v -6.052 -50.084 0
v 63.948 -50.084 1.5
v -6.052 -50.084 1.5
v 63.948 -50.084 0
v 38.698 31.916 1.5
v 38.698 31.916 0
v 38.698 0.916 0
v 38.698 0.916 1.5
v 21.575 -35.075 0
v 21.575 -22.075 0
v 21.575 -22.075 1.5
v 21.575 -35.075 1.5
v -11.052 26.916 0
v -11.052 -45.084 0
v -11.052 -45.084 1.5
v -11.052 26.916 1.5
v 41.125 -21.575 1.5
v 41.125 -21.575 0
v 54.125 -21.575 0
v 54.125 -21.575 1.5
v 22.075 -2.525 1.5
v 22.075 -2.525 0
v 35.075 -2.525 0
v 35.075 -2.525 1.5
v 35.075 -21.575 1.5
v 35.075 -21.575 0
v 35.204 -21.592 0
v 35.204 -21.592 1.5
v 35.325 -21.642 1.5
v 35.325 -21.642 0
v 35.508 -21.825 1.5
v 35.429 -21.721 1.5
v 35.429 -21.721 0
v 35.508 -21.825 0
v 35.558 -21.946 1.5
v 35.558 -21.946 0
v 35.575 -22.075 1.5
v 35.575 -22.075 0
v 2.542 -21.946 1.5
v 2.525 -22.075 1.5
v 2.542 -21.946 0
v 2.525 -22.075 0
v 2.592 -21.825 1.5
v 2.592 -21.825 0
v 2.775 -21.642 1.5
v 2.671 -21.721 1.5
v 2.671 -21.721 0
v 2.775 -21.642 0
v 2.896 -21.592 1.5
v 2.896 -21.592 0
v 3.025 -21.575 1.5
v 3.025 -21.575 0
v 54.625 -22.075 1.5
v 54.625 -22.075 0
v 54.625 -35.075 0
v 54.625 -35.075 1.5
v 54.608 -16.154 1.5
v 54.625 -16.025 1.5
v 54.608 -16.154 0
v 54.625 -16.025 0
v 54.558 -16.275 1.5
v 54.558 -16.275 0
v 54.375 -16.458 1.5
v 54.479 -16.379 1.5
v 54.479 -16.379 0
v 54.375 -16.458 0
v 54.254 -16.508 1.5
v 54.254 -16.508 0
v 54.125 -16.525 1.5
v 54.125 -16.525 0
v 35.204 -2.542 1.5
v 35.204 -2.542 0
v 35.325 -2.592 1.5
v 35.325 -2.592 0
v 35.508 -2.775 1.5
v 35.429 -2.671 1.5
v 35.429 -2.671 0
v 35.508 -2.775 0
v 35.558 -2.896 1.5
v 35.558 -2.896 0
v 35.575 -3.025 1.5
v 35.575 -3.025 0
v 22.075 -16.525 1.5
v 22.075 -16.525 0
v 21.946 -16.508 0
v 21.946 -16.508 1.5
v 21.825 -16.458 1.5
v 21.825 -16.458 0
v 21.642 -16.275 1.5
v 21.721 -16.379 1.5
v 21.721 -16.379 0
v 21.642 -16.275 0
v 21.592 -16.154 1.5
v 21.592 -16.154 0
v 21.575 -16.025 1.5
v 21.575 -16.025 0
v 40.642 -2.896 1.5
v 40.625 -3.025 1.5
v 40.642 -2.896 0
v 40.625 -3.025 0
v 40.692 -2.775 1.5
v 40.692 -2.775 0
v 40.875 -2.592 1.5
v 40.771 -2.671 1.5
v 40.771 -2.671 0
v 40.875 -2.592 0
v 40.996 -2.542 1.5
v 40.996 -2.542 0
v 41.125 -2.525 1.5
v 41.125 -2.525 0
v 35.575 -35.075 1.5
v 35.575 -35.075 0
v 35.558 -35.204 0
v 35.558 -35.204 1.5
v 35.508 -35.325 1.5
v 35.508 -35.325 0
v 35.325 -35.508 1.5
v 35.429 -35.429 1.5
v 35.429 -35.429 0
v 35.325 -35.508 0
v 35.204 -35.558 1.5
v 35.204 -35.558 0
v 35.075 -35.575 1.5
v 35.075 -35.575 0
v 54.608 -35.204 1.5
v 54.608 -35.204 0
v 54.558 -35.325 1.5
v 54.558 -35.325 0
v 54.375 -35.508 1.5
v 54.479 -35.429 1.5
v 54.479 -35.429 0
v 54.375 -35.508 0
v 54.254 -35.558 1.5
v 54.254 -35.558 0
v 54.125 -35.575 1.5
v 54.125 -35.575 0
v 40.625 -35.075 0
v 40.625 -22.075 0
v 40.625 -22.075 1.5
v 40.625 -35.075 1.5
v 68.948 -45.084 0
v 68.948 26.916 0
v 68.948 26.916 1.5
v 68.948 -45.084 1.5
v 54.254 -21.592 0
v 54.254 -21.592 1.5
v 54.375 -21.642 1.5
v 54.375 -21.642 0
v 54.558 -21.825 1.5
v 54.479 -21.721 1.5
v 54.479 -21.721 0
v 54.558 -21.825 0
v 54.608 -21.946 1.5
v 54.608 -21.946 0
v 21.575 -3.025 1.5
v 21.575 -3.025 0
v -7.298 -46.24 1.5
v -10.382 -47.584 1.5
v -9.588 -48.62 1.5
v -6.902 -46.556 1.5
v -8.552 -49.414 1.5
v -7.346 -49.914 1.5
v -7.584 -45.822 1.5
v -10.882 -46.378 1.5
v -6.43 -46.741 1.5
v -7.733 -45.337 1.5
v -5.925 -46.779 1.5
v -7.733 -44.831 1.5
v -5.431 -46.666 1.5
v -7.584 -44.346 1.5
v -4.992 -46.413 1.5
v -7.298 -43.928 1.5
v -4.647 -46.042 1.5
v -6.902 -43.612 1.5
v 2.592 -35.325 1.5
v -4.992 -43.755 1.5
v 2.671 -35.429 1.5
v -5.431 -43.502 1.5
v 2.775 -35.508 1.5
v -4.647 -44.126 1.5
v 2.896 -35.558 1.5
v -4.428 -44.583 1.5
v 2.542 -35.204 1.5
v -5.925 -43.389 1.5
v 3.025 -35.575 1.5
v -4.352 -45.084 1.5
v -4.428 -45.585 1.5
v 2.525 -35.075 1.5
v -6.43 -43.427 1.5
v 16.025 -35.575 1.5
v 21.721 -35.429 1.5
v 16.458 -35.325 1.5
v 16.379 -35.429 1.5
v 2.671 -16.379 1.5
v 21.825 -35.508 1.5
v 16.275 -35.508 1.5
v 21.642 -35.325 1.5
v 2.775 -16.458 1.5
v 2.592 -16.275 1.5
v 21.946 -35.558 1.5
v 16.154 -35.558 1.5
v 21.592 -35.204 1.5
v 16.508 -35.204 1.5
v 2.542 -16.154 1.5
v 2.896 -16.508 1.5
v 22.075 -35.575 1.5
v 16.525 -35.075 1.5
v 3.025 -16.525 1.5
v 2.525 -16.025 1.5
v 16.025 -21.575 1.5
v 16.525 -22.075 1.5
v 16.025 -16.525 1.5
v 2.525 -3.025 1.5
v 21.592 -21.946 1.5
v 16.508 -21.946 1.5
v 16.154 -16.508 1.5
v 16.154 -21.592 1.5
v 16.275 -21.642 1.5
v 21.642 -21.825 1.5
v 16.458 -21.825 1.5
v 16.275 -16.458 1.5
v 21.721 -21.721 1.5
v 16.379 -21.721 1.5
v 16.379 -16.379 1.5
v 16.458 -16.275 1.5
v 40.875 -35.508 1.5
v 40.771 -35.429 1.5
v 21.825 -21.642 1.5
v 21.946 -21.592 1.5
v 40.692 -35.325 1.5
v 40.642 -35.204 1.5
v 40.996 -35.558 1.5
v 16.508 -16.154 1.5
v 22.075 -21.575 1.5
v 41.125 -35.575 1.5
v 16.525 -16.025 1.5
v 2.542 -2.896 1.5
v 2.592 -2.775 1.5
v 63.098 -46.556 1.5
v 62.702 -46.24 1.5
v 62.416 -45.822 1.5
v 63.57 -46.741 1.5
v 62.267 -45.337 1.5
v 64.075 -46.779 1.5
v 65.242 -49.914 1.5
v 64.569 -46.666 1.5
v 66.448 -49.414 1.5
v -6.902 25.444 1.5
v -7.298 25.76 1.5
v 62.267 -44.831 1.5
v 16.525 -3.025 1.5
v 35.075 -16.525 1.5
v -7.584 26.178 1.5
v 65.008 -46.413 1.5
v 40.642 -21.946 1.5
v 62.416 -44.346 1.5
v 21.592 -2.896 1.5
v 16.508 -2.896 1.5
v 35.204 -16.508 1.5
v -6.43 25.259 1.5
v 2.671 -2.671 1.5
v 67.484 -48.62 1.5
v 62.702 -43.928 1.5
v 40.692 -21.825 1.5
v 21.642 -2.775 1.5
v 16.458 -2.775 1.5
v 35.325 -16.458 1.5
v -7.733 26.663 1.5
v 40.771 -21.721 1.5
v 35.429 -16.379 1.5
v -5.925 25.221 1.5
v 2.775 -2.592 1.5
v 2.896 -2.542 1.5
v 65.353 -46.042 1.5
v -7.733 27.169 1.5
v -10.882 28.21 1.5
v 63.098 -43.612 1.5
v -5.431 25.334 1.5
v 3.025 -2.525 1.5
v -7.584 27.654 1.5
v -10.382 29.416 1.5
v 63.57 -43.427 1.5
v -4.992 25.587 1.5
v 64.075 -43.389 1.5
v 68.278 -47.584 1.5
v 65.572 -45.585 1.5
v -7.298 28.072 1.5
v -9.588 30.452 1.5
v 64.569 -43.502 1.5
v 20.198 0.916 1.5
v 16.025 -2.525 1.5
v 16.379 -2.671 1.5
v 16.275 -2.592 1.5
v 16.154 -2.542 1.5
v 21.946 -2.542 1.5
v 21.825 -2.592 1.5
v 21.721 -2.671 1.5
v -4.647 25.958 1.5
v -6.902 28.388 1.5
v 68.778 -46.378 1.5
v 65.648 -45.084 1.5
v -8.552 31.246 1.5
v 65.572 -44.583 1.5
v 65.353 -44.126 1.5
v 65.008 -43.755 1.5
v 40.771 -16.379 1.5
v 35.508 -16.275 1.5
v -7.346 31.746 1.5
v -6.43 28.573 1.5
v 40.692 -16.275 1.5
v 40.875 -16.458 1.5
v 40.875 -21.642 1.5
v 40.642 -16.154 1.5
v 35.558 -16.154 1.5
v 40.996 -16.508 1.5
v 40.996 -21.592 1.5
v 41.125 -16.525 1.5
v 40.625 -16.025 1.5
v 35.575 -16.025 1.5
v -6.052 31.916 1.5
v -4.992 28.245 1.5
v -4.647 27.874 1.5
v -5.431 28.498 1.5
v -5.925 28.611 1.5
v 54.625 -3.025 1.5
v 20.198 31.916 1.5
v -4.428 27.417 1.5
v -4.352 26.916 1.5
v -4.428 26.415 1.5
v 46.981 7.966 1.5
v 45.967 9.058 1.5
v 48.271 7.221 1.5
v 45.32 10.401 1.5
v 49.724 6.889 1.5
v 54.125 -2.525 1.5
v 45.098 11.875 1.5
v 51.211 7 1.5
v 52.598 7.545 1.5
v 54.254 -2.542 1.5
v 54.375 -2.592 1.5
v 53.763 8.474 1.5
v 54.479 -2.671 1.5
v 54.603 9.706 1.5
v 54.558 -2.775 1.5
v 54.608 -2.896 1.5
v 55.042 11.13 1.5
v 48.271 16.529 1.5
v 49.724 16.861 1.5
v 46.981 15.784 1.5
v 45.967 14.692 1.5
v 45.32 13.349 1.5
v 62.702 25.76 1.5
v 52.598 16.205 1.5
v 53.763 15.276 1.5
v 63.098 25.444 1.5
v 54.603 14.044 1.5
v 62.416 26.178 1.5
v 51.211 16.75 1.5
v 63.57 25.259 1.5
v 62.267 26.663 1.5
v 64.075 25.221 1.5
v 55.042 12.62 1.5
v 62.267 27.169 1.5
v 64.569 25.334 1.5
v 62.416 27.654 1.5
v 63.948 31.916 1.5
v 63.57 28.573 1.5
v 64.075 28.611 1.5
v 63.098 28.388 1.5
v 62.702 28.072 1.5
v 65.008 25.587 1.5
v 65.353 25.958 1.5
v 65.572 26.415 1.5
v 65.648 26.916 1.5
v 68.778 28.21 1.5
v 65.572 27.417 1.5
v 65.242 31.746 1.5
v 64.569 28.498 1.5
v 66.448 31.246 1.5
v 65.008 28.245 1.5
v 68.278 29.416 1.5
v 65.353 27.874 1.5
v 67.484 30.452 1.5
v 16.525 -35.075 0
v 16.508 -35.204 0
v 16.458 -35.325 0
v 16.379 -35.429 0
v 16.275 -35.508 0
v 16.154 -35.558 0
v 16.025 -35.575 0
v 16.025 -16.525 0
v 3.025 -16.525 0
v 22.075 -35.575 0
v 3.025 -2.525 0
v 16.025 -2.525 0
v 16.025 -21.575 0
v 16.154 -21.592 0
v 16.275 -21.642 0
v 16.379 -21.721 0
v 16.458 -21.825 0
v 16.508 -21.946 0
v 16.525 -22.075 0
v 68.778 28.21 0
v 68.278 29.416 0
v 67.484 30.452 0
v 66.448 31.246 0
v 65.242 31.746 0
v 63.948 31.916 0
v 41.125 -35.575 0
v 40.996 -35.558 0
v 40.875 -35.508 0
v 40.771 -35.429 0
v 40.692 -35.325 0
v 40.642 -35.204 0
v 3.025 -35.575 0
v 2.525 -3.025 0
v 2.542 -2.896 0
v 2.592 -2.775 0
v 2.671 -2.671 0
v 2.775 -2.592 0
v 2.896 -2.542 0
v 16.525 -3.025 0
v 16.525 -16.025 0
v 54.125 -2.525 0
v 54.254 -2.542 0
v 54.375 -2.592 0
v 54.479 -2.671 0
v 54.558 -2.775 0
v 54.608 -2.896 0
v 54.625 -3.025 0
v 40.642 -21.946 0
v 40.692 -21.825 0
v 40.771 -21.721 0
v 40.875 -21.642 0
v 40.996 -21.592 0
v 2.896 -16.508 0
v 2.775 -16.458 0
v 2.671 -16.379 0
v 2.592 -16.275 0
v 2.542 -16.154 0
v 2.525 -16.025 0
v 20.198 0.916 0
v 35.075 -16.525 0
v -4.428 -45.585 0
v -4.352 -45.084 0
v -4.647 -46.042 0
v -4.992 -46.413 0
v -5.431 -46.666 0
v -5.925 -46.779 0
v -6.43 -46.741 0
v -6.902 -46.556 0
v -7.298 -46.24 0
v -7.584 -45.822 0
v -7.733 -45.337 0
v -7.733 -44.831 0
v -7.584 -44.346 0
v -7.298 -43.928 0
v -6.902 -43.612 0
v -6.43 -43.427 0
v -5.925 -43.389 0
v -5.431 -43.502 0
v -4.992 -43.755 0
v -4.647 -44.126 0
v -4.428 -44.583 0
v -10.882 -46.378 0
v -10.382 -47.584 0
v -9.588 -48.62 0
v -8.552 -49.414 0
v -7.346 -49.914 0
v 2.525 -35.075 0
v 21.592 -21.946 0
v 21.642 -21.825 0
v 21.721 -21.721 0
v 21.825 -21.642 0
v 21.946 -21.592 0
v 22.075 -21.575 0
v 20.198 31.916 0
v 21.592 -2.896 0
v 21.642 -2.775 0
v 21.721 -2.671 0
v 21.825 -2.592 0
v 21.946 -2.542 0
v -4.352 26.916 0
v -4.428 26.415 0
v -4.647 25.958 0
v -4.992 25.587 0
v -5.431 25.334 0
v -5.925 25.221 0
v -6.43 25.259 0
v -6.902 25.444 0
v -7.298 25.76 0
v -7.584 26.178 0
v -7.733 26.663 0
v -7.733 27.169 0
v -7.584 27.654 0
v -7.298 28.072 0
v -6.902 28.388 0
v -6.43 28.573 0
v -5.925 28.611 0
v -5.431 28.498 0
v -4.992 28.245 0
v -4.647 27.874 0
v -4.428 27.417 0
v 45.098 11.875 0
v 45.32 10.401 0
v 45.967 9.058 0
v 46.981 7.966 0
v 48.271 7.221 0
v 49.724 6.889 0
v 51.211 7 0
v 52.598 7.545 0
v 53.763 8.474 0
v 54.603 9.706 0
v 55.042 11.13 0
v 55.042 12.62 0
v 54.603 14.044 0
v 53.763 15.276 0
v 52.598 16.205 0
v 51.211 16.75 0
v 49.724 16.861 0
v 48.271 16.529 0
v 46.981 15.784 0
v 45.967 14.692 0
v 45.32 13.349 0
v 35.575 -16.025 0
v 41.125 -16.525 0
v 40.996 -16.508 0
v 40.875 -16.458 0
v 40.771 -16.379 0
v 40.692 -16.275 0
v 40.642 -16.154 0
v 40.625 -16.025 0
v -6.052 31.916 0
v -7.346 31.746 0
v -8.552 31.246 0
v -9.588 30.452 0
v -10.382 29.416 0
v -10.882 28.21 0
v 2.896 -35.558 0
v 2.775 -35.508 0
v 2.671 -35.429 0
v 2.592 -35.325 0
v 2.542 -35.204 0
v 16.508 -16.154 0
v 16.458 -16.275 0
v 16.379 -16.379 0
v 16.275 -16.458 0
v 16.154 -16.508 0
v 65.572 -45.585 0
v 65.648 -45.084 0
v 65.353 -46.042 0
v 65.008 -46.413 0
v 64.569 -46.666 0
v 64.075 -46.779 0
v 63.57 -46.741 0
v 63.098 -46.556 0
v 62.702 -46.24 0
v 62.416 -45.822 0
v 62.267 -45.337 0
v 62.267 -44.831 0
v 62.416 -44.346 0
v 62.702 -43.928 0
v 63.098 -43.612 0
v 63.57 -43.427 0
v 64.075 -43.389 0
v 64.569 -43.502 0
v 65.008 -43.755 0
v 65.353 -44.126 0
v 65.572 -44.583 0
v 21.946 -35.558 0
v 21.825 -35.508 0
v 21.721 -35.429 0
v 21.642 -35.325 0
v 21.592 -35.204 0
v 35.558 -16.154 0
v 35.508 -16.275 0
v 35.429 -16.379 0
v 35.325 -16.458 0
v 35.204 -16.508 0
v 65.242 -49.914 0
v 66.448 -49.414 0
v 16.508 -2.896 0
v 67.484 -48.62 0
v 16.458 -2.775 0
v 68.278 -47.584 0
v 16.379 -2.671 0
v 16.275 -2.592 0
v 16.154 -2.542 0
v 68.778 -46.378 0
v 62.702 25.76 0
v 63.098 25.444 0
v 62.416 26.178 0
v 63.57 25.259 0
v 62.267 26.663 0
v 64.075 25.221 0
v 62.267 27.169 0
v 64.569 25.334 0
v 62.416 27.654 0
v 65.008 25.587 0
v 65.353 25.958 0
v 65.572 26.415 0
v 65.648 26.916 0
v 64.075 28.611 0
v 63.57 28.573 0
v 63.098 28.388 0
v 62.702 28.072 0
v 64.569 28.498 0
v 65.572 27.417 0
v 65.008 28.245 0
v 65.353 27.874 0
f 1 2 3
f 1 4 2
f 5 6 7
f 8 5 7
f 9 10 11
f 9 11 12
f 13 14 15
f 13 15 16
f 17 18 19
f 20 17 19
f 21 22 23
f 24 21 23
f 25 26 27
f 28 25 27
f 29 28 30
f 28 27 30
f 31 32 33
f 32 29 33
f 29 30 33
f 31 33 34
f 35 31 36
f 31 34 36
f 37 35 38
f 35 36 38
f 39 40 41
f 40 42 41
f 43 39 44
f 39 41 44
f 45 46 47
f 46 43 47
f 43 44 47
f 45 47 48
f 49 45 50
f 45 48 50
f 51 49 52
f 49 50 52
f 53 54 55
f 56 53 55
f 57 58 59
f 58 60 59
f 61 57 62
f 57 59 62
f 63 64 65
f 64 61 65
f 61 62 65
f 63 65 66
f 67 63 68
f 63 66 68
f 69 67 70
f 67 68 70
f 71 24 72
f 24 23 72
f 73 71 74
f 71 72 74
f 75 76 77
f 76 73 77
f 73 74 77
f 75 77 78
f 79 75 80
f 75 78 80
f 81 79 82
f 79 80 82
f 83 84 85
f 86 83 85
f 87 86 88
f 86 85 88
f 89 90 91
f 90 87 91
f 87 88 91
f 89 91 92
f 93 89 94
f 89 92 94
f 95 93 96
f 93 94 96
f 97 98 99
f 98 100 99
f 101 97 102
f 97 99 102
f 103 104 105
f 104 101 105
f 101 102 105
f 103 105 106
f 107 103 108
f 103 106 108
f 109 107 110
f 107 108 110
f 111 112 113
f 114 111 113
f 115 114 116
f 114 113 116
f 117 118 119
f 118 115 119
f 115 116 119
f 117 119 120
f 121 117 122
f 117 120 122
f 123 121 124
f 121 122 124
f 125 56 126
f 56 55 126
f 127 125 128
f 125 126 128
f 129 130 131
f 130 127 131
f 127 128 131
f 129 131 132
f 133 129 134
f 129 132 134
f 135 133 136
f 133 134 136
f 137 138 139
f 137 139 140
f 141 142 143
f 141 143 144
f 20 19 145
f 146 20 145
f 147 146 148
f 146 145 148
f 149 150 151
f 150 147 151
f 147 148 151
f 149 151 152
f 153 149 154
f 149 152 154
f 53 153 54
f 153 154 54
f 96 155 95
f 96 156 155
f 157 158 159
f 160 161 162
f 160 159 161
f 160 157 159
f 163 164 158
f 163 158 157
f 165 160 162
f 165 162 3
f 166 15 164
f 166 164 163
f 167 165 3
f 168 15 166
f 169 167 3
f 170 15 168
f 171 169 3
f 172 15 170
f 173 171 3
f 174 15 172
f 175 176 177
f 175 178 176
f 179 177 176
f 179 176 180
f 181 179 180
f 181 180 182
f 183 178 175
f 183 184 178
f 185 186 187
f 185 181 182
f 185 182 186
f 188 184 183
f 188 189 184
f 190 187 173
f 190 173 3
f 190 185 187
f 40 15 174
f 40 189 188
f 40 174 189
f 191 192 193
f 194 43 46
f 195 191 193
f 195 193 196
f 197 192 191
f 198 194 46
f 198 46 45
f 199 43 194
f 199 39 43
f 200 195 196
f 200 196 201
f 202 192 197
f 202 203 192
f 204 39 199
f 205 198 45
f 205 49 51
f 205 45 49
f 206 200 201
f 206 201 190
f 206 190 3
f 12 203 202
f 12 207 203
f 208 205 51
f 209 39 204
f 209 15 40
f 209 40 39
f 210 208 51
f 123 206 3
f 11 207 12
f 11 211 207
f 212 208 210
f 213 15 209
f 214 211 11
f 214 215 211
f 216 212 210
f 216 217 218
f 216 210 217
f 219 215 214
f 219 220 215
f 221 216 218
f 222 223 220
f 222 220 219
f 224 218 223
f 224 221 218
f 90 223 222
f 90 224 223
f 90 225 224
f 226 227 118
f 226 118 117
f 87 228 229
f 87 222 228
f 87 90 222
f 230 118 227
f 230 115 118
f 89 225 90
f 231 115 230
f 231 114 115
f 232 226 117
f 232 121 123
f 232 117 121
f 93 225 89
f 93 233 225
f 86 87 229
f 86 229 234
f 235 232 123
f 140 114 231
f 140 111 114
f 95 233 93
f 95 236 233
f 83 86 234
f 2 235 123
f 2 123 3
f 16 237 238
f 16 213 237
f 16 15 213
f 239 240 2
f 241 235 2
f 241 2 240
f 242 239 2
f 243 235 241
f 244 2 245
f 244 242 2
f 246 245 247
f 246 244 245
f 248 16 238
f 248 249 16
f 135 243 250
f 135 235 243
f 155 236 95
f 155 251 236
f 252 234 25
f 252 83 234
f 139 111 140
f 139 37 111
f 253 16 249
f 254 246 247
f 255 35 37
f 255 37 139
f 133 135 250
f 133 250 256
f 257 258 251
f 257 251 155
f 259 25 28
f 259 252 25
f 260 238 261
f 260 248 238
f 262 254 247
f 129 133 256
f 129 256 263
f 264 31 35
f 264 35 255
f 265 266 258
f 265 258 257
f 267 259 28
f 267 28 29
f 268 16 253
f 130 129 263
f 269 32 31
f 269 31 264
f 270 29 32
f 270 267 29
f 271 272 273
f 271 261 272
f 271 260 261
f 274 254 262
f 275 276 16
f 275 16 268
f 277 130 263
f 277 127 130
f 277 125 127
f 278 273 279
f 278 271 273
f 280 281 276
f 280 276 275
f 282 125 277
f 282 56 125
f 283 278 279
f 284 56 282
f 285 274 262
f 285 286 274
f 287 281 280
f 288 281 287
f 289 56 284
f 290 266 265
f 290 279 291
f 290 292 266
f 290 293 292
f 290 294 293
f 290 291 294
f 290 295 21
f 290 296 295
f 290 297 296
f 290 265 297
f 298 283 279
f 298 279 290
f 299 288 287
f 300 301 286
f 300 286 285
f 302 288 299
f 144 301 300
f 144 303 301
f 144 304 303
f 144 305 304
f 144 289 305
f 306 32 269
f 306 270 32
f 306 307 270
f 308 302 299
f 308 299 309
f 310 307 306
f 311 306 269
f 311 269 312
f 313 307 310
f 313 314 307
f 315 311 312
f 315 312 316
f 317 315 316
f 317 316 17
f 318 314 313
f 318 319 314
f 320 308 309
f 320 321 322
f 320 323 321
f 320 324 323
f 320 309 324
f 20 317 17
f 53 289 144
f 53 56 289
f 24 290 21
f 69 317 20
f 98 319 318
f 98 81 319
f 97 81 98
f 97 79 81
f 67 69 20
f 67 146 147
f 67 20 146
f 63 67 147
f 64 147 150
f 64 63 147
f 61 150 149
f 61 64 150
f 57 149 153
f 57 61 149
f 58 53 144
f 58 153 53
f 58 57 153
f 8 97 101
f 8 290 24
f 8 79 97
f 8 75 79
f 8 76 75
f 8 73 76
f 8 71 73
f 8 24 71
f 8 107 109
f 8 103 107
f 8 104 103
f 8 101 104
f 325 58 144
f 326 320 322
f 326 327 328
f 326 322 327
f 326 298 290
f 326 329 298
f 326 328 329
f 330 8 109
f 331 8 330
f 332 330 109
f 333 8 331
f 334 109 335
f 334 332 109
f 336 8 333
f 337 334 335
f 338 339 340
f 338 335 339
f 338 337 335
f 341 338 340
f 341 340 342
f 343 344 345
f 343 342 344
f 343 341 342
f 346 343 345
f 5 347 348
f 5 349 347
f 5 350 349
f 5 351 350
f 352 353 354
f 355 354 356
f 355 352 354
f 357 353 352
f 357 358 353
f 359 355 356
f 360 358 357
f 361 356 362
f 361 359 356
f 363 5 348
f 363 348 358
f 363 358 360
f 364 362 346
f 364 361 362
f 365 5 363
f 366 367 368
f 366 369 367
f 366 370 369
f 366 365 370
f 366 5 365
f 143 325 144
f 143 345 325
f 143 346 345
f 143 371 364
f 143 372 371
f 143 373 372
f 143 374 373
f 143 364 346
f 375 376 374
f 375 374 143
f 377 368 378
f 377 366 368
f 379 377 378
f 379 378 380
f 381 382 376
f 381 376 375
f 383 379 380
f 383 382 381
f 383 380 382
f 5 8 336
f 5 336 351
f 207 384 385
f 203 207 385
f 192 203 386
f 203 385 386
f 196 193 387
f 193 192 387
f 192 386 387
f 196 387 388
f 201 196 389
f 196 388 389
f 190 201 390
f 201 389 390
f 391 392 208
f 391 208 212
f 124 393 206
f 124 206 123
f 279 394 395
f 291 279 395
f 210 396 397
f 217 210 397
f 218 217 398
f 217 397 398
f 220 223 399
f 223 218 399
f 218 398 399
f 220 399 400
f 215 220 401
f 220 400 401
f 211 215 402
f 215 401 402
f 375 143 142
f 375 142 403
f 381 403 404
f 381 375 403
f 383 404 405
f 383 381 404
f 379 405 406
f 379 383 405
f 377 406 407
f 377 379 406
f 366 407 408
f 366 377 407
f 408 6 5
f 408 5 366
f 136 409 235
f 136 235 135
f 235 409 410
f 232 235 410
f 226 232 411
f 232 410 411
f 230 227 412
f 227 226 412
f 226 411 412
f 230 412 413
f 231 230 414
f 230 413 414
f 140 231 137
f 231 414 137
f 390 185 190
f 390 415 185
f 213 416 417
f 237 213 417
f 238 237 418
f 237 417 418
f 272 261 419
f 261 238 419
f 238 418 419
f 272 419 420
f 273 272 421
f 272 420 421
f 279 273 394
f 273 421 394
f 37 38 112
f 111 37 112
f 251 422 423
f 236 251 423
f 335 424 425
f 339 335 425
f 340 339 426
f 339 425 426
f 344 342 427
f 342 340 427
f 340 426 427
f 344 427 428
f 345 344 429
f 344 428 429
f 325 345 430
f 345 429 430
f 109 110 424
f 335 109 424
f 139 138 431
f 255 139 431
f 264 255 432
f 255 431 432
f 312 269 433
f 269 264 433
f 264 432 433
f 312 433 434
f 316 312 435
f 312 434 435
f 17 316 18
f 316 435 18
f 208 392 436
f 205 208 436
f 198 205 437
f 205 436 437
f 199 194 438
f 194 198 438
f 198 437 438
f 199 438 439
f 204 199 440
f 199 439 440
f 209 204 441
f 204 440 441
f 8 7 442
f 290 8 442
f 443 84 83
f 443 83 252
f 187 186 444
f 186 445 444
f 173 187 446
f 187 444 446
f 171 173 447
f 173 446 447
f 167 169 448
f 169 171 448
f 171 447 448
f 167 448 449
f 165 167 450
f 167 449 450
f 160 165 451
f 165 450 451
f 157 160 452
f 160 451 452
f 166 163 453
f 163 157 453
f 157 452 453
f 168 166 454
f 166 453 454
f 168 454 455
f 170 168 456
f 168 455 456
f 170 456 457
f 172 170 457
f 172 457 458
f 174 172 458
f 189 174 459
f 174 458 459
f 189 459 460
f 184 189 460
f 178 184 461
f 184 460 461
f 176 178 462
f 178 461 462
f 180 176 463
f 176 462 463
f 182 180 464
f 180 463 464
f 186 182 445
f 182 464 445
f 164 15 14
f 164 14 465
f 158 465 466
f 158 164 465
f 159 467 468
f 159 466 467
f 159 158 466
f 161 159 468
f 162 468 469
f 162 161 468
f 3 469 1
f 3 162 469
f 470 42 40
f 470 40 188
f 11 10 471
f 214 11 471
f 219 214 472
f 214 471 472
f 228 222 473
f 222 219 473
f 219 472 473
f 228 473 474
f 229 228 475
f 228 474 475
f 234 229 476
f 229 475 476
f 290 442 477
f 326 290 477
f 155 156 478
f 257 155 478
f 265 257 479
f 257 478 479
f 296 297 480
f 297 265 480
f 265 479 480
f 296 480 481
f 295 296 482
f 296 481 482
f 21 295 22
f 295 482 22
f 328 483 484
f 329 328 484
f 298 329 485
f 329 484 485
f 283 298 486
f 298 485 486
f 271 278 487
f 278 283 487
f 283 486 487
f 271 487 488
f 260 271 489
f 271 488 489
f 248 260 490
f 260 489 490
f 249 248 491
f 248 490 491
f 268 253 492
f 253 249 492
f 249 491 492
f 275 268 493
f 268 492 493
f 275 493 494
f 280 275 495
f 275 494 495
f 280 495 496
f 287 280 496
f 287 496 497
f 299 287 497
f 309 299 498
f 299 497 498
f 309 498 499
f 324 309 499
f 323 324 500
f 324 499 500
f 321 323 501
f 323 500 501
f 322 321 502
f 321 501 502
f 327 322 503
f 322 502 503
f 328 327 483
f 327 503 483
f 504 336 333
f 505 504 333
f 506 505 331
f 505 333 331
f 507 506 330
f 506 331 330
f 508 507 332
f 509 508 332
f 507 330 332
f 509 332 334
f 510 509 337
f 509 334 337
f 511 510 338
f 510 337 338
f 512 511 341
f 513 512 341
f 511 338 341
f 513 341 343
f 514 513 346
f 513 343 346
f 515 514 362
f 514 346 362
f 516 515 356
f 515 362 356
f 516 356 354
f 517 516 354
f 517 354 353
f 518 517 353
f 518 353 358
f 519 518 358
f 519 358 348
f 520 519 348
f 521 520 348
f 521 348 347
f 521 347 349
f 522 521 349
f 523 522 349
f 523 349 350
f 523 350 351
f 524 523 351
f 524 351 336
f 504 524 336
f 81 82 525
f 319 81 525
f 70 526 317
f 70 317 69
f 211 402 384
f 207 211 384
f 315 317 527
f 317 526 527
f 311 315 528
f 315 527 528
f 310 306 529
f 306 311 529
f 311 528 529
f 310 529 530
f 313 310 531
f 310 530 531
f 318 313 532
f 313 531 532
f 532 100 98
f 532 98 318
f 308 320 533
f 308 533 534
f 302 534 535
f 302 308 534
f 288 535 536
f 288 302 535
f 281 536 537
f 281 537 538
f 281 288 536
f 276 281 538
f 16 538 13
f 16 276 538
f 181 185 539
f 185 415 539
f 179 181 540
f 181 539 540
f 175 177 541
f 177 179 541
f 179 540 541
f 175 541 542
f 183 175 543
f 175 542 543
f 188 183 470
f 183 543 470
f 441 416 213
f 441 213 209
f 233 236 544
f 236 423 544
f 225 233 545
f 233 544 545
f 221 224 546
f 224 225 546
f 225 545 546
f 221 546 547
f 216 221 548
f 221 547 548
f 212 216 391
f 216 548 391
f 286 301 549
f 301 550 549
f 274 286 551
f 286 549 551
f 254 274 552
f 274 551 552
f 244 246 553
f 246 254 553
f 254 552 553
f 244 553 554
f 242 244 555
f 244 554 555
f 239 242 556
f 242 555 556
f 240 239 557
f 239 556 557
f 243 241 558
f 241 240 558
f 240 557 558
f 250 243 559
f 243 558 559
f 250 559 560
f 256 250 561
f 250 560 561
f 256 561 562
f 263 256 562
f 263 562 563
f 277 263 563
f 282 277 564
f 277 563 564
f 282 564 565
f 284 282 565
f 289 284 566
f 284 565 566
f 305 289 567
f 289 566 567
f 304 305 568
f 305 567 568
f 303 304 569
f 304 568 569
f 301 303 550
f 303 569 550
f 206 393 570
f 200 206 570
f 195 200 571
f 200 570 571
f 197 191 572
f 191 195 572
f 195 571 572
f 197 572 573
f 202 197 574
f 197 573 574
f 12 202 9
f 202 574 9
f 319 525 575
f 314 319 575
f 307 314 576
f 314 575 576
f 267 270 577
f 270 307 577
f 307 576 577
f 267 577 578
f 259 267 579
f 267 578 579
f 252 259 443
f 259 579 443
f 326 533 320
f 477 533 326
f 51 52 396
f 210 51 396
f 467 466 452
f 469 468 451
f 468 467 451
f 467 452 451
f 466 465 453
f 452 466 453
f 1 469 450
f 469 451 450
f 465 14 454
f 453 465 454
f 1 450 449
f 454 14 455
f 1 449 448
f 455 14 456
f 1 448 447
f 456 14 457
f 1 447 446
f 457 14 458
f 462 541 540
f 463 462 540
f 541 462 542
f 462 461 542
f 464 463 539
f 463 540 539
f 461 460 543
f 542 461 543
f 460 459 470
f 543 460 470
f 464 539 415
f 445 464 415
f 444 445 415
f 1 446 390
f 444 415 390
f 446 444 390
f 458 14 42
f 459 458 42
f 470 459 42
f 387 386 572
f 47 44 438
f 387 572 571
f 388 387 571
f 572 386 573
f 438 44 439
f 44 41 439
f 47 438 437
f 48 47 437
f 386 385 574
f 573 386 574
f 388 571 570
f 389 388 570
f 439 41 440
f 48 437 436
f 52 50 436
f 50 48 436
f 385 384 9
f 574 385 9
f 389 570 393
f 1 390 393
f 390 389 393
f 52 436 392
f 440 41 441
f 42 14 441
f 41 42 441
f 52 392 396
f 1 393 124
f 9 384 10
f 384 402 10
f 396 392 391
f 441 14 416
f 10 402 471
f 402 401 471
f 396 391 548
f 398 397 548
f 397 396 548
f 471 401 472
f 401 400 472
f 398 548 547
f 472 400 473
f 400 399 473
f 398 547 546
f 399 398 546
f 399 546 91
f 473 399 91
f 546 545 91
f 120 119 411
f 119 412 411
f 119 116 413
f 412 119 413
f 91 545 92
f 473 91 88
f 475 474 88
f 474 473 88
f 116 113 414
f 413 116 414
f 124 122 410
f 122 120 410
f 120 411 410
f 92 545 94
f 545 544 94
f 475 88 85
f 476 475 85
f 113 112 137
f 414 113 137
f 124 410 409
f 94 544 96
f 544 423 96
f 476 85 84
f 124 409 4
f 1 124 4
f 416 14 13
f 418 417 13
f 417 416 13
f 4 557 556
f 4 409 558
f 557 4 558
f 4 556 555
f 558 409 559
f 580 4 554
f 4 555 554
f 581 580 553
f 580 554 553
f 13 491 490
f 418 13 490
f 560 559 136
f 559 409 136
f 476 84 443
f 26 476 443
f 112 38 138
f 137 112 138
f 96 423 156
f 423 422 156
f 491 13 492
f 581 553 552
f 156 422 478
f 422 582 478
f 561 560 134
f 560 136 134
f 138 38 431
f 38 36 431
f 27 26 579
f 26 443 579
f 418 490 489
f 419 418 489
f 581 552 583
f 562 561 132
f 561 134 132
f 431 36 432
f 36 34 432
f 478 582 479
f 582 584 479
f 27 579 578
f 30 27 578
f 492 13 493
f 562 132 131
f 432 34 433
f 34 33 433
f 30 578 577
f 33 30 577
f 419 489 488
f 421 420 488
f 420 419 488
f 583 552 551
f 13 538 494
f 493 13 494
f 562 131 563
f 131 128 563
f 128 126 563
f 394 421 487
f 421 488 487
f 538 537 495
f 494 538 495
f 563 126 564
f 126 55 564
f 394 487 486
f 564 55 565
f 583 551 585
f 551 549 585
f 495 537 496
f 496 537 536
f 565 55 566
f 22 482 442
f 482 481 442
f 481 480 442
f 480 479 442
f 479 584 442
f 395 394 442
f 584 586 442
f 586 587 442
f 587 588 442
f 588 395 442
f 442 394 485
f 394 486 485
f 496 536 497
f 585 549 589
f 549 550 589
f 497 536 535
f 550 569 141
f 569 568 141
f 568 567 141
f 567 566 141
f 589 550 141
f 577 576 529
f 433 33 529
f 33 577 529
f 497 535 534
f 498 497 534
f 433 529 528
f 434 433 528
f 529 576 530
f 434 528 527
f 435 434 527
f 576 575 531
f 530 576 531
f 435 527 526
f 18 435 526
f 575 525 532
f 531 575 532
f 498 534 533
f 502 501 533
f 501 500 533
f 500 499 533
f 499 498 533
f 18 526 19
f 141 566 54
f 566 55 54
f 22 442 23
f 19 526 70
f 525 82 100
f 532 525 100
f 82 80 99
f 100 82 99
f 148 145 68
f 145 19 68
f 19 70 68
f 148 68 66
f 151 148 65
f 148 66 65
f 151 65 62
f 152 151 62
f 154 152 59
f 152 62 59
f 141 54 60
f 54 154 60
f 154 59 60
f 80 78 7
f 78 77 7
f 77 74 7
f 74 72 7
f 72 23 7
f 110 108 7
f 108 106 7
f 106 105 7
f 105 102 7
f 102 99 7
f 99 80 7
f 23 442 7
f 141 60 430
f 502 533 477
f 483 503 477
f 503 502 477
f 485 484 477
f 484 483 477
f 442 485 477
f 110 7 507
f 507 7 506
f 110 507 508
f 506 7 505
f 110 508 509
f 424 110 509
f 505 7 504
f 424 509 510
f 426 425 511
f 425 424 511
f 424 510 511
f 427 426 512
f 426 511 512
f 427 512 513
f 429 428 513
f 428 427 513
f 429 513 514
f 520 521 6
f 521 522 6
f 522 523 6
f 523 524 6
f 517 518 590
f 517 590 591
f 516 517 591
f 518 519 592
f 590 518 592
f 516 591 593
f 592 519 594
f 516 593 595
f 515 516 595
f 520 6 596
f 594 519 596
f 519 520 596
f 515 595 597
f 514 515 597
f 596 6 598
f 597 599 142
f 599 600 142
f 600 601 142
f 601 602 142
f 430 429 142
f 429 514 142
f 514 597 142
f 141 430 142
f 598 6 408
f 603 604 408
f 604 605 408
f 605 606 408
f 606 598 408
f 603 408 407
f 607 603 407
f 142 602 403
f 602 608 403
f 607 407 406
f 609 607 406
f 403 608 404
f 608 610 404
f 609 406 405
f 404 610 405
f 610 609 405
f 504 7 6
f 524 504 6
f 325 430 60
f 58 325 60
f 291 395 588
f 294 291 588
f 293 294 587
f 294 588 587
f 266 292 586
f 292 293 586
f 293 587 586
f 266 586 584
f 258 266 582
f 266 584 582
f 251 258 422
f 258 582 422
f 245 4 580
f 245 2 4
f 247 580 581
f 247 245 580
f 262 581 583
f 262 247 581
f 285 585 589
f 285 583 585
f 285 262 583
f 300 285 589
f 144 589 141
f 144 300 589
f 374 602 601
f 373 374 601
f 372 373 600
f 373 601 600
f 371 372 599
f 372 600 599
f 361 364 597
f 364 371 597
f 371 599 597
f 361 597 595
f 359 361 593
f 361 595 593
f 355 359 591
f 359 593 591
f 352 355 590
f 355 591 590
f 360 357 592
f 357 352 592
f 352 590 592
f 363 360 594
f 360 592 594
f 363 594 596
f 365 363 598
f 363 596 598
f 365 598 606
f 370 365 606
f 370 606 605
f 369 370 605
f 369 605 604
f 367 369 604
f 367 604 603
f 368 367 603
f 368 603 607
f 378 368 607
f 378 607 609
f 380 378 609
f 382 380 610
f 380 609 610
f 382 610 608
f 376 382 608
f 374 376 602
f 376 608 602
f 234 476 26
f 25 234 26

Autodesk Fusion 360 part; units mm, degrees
sketch "Sketch1" plane through (0, 0, 0) normal (0, 0, 1) x (1, 0, 0)
  line L0 (3.025, -2.525) -> (16.025, -2.525)
  line L1 (3.025, -16.525) -> (16.025, -16.525)
  line L2 (2.525, -3.025) -> (2.525, -16.025)
  line L3 (16.525, -3.025) -> (16.525, -16.025)
  arc A0 (3.025, -2.525) -> (2.525, -3.025) centre (3.025, -3.025) ccw
  arc A1 (16.525, -3.025) -> (16.025, -2.525) centre (16.025, -3.025) ccw
  arc A2 (2.525, -16.025) -> (3.025, -16.525) centre (3.025, -16.025) ccw
  arc A3 (16.025, -16.525) -> (16.525, -16.025) centre (16.025, -16.025) ccw
  line L4 (22.075, -2.525) -> (35.075, -2.525)
  line L5 (22.075, -16.525) -> (35.075, -16.525)
  line L6 (21.575, -3.025) -> (21.575, -16.025)
  line L7 (35.575, -3.025) -> (35.575, -16.025)
  arc A4 (22.075, -2.525) -> (21.575, -3.025) centre (22.075, -3.025) ccw
  arc A5 (35.575, -3.025) -> (35.075, -2.525) centre (35.075, -3.025) ccw
  arc A6 (21.575, -16.025) -> (22.075, -16.525) centre (22.075, -16.025) ccw
  arc A7 (35.075, -16.525) -> (35.575, -16.025) centre (35.075, -16.025) ccw
  line L8 (41.125, -2.525) -> (54.125, -2.525)
  line L9 (41.125, -16.525) -> (54.125, -16.525)
  line L10 (40.625, -3.025) -> (40.625, -16.025)
  line L11 (54.625, -3.025) -> (54.625, -16.025)
  arc A8 (41.125, -2.525) -> (40.625, -3.025) centre (41.125, -3.025) ccw
  arc A9 (54.625, -3.025) -> (54.125, -2.525) centre (54.125, -3.025) ccw
  arc A10 (40.625, -16.025) -> (41.125, -16.525) centre (41.125, -16.025) ccw
  arc A11 (54.125, -16.525) -> (54.625, -16.025) centre (54.125, -16.025) ccw
  line L12 (3.025, -21.575) -> (16.025, -21.575)
  line L13 (3.025, -35.575) -> (16.025, -35.575)
  line L14 (2.525, -22.075) -> (2.525, -35.075)
  line L15 (16.525, -22.075) -> (16.525, -35.075)
  arc A12 (3.025, -21.575) -> (2.525, -22.075) centre (3.025, -22.075) ccw
  arc A13 (16.525, -22.075) -> (16.025, -21.575) centre (16.025, -22.075) ccw
  arc A14 (2.525, -35.075) -> (3.025, -35.575) centre (3.025, -35.075) ccw
  arc A15 (16.025, -35.575) -> (16.525, -35.075) centre (16.025, -35.075) ccw
  line L16 (22.075, -21.575) -> (35.075, -21.575)
  line L17 (22.075, -35.575) -> (35.075, -35.575)
  line L18 (21.575, -22.075) -> (21.575, -35.075)
  line L19 (35.575, -22.075) -> (35.575, -35.075)
  arc A16 (22.075, -21.575) -> (21.575, -22.075) centre (22.075, -22.075) ccw
  arc A17 (35.575, -22.075) -> (35.075, -21.575) centre (35.075, -22.075) ccw
  arc A18 (21.575, -35.075) -> (22.075, -35.575) centre (22.075, -35.075) ccw
  arc A19 (35.075, -35.575) -> (35.575, -35.075) centre (35.075, -35.075) ccw
  line L20 (41.125, -21.575) -> (54.125, -21.575)
  line L21 (41.125, -35.575) -> (54.125, -35.575)
  line L22 (40.625, -22.075) -> (40.625, -35.075)
  line L23 (54.625, -22.075) -> (54.625, -35.075)
  arc A20 (41.125, -21.575) -> (40.625, -22.075) centre (41.125, -22.075) ccw
  arc A21 (54.625, -22.075) -> (54.125, -21.575) centre (54.125, -22.075) ccw
  arc A22 (40.625, -35.075) -> (41.125, -35.575) centre (41.125, -35.075) ccw
  arc A23 (54.125, -35.575) -> (54.625, -35.075) centre (54.125, -35.075) ccw
  line L24 (-11.052, 31.916) -> (68.948, 31.916)
  line L25 (68.948, 31.916) -> (68.948, -50.084)
  line L26 (68.948, -50.084) -> (-11.052, -50.084)
  line L27 (-11.052, -50.084) -> (-11.052, 31.916)
  line L28 (20.198, 31.916) -> (38.698, 31.916)
  line L29 (38.698, 31.916) -> (38.698, 0.916)
  line L30 (38.698, 0.916) -> (20.198, 0.916)
  line L31 (20.198, 0.916) -> (20.198, 31.916)
  circle A24 centre (-6.052, 26.916) radius 1.7
  circle A25 centre (-6.052, -45.084) radius 1.7
  circle A26 centre (63.948, -45.084) radius 1.7
  circle A27 centre (63.948, 26.916) radius 1.7
  dimension "d1" = 80
  dimension "d2" = 82
  dimension "d4" = 13.577
  dimension "d5" = 14.509
  dimension "d6" = 18.5
  dimension "d7" = 31
  dimension "d8" = 31.25
  dimension "d9" = 3.4
  dimension "d10" = 5
  dimension "d11" = 5
  dimension "d12" = 3.4
  dimension "d13" = 5
  dimension "d14" = 5
  dimension "d15" = 3.4
  dimension "d16" = 5
  dimension "d17" = 5
  dimension "d18" = 3.4
  dimension "d19" = 5
  dimension "d20" = 5
extrude "Extrude1" add sketch "Sketch1" along normal blind 1.5 contours L24 L25 L26 L27 L29 L30 L31
fillet "Fillet1" radius 5 4 edges at (-11.052, -50.084, 0.75) (-11.052, 31.916, 0.75) (68.948, -50.084, 0.75) (68.948, 31.916, 0.75)
sketch "Sketch2" plane through (0, 0, 1.5) normal (0, 0, 1) x (-1, 0, 0)
  arc A0 (-68.948, -26.916) -> (-63.948, -31.916) centre (-63.948, -26.916) ccw
  line L0 (-63.948, -31.916) -> (-38.698, -31.916)
  line L1 (-38.698, -31.916) -> (-38.698, -0.916)
  line L2 (-38.698, -0.916) -> (-20.198, -0.916)
  line L3 (-20.198, -0.916) -> (-20.198, -31.916)
  line L4 (-20.198, -31.916) -> (6.052, -31.916)
  arc A1 (6.052, -31.916) -> (11.052, -26.916) centre (6.052, -26.916) ccw
  line L5 (11.052, -26.916) -> (11.052, 45.084)
  arc A2 (11.052, 45.084) -> (6.052, 50.084) centre (6.052, 45.084) ccw
  line L6 (6.052, 50.084) -> (-63.948, 50.084)
  arc A3 (-63.948, 50.084) -> (-68.948, 45.084) centre (-63.948, 45.084) ccw
  line L7 (-68.948, 45.084) -> (-68.948, -26.916)
  arc A4 (-41.125, 2.525) -> (-40.625, 3.025) centre (-41.125, 3.025) ccw
  line L8 (-41.125, 2.525) -> (-54.125, 2.525)
  arc A5 (-54.625, 3.025) -> (-54.125, 2.525) centre (-54.125, 3.025) ccw
  line L9 (-54.625, 3.025) -> (-54.625, 16.025)
  arc A6 (-54.125, 16.525) -> (-54.625, 16.025) centre (-54.125, 16.025) ccw
  line L10 (-54.125, 16.525) -> (-41.125, 16.525)
  arc A7 (-40.625, 16.025) -> (-41.125, 16.525) centre (-41.125, 16.025) ccw
  line L11 (-40.625, 16.025) -> (-40.625, 3.025)
  arc A8 (-22.075, 2.525) -> (-21.575, 3.025) centre (-22.075, 3.025) ccw
  line L12 (-22.075, 2.525) -> (-35.075, 2.525)
  arc A9 (-35.575, 3.025) -> (-35.075, 2.525) centre (-35.075, 3.025) ccw
  line L13 (-35.575, 3.025) -> (-35.575, 16.025)
  arc A10 (-35.075, 16.525) -> (-35.575, 16.025) centre (-35.075, 16.025) ccw
  line L14 (-35.075, 16.525) -> (-22.075, 16.525)
  arc A11 (-21.575, 16.025) -> (-22.075, 16.525) centre (-22.075, 16.025) ccw
  line L15 (-21.575, 16.025) -> (-21.575, 3.025)
  circle A12 centre (-63.948, 45.084) radius 1.7
  arc A13 (-3.025, 21.575) -> (-2.525, 22.075) centre (-3.025, 22.075) ccw
  line L16 (-3.025, 21.575) -> (-16.025, 21.575)
  arc A14 (-16.525, 22.075) -> (-16.025, 21.575) centre (-16.025, 22.075) ccw
  line L17 (-16.525, 22.075) -> (-16.525, 35.075)
  arc A15 (-16.025, 35.575) -> (-16.525, 35.075) centre (-16.025, 35.075) ccw
  line L18 (-16.025, 35.575) -> (-3.025, 35.575)
  arc A16 (-2.525, 35.075) -> (-3.025, 35.575) centre (-3.025, 35.075) ccw
  line L19 (-2.525, 35.075) -> (-2.525, 22.075)
  arc A17 (-3.025, 2.525) -> (-2.525, 3.025) centre (-3.025, 3.025) ccw
  line L20 (-3.025, 2.525) -> (-16.025, 2.525)
  arc A18 (-16.525, 3.025) -> (-16.025, 2.525) centre (-16.025, 3.025) ccw
  line L21 (-16.525, 3.025) -> (-16.525, 16.025)
  arc A19 (-16.025, 16.525) -> (-16.525, 16.025) centre (-16.025, 16.025) ccw
  line L22 (-16.025, 16.525) -> (-3.025, 16.525)
  arc A20 (-2.525, 16.025) -> (-3.025, 16.525) centre (-3.025, 16.025) ccw
  line L23 (-2.525, 16.025) -> (-2.525, 3.025)
  circle A21 centre (6.052, 45.084) radius 1.7
  arc A22 (-41.125, 21.575) -> (-40.625, 22.075) centre (-41.125, 22.075) ccw
  line L24 (-41.125, 21.575) -> (-54.125, 21.575)
  arc A23 (-54.625, 22.075) -> (-54.125, 21.575) centre (-54.125, 22.075) ccw
  line L25 (-54.625, 22.075) -> (-54.625, 35.075)
  arc A24 (-54.125, 35.575) -> (-54.625, 35.075) centre (-54.125, 35.075) ccw
  line L26 (-54.125, 35.575) -> (-41.125, 35.575)
  arc A25 (-40.625, 35.075) -> (-41.125, 35.575) centre (-41.125, 35.075) ccw
  line L27 (-40.625, 35.075) -> (-40.625, 22.075)
  circle A26 centre (6.052, -26.916) radius 1.7
  arc A27 (-22.075, 21.575) -> (-21.575, 22.075) centre (-22.075, 22.075) ccw
  line L28 (-22.075, 21.575) -> (-35.075, 21.575)
  arc A28 (-35.575, 22.075) -> (-35.075, 21.575) centre (-35.075, 22.075) ccw
  line L29 (-35.575, 22.075) -> (-35.575, 35.075)
  arc A29 (-35.075, 35.575) -> (-35.575, 35.075) centre (-35.075, 35.075) ccw
  line L30 (-35.075, 35.575) -> (-22.075, 35.575)
  arc A30 (-21.575, 35.075) -> (-22.075, 35.575) centre (-22.075, 35.075) ccw
  line L31 (-21.575, 35.075) -> (-21.575, 22.075)
  circle A31 centre (-63.948, -26.916) radius 1.7
  circle A32 centre (-50.098, -11.875) radius 5
  dimension "d28" = 10
  dimension "d29" = 14.4
  dimension "d30" = 11.4
extrude "Extrude2" cut sketch "Sketch2" against normal blind 5 contours A32
